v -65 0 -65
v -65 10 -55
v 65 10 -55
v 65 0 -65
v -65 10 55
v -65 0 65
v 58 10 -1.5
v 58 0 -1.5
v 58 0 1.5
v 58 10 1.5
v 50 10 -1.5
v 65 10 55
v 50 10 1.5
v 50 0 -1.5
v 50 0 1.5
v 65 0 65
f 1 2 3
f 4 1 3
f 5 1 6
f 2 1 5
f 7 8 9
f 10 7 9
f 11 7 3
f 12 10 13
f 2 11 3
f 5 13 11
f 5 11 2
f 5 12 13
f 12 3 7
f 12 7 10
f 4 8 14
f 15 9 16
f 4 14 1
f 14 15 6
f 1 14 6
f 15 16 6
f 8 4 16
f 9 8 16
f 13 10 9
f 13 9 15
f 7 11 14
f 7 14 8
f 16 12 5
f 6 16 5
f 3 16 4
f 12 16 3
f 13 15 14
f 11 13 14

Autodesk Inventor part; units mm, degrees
ref_plane "YZ Plane" through (0, 0, 0) normal (1, 0, 0) x (0, 1, 0)
ref_plane "XZ Plane" through (0, 0, 0) normal (0, 1, 0) x (-1, 0, 0)
ref_plane "XY Plane" through (0, 0, 0) normal (0, 0, 1) x (1, 0, 0)
sketch "Sketch1" plane through (0, 0, 0) normal (0, 1, 0) x (-1, 0, 0)
  line L0 (-65, -65) -> (65, -65)
  line L1 (65, -65) -> (65, 65)
  line L2 (65, 65) -> (-65, 65)
  line L3 (-65, 65) -> (-65, -65)
  line L4 (-65, -65) -> (65, 65) construction
  line L5 (65, -65) -> (-65, 65) construction
  point P0 (0, 0)
  dimension "d0" = 130
  dimension "d1" = 130
extrude "Extrusion1" add sketch "Sketch1" along normal blind 10
chamfer "Chamfer1" distance 10 angle 45 2 edges at (0, 10, 65) (0, 10, -65)
sketch "Sketch2" plane through (0, 10, 0) normal (0, 1, 0) x (1, 0, 0)
  line L0 (58, -1.5) -> (50, -1.5)
  line L1 (50, -1.5) -> (50, 1.5)
  line L2 (50, 1.5) -> (58, 1.5)
  line L3 (58, 1.5) -> (58, -1.5)
  line L4 (58, -1.5) -> (50, 1.5) construction
  line L5 (50, -1.5) -> (58, 1.5) construction
  line L6 (65, -55) -> (65, 55) projected
  point P0 (0, 0)
  point P1 (54, 0)
  dimension "d7" = 8
  dimension "d8" = 3
  dimension "d9" = 7
extrude "Extrusion2" cut sketch "Sketch2" against normal blind 10
properties part number "inner_side"
